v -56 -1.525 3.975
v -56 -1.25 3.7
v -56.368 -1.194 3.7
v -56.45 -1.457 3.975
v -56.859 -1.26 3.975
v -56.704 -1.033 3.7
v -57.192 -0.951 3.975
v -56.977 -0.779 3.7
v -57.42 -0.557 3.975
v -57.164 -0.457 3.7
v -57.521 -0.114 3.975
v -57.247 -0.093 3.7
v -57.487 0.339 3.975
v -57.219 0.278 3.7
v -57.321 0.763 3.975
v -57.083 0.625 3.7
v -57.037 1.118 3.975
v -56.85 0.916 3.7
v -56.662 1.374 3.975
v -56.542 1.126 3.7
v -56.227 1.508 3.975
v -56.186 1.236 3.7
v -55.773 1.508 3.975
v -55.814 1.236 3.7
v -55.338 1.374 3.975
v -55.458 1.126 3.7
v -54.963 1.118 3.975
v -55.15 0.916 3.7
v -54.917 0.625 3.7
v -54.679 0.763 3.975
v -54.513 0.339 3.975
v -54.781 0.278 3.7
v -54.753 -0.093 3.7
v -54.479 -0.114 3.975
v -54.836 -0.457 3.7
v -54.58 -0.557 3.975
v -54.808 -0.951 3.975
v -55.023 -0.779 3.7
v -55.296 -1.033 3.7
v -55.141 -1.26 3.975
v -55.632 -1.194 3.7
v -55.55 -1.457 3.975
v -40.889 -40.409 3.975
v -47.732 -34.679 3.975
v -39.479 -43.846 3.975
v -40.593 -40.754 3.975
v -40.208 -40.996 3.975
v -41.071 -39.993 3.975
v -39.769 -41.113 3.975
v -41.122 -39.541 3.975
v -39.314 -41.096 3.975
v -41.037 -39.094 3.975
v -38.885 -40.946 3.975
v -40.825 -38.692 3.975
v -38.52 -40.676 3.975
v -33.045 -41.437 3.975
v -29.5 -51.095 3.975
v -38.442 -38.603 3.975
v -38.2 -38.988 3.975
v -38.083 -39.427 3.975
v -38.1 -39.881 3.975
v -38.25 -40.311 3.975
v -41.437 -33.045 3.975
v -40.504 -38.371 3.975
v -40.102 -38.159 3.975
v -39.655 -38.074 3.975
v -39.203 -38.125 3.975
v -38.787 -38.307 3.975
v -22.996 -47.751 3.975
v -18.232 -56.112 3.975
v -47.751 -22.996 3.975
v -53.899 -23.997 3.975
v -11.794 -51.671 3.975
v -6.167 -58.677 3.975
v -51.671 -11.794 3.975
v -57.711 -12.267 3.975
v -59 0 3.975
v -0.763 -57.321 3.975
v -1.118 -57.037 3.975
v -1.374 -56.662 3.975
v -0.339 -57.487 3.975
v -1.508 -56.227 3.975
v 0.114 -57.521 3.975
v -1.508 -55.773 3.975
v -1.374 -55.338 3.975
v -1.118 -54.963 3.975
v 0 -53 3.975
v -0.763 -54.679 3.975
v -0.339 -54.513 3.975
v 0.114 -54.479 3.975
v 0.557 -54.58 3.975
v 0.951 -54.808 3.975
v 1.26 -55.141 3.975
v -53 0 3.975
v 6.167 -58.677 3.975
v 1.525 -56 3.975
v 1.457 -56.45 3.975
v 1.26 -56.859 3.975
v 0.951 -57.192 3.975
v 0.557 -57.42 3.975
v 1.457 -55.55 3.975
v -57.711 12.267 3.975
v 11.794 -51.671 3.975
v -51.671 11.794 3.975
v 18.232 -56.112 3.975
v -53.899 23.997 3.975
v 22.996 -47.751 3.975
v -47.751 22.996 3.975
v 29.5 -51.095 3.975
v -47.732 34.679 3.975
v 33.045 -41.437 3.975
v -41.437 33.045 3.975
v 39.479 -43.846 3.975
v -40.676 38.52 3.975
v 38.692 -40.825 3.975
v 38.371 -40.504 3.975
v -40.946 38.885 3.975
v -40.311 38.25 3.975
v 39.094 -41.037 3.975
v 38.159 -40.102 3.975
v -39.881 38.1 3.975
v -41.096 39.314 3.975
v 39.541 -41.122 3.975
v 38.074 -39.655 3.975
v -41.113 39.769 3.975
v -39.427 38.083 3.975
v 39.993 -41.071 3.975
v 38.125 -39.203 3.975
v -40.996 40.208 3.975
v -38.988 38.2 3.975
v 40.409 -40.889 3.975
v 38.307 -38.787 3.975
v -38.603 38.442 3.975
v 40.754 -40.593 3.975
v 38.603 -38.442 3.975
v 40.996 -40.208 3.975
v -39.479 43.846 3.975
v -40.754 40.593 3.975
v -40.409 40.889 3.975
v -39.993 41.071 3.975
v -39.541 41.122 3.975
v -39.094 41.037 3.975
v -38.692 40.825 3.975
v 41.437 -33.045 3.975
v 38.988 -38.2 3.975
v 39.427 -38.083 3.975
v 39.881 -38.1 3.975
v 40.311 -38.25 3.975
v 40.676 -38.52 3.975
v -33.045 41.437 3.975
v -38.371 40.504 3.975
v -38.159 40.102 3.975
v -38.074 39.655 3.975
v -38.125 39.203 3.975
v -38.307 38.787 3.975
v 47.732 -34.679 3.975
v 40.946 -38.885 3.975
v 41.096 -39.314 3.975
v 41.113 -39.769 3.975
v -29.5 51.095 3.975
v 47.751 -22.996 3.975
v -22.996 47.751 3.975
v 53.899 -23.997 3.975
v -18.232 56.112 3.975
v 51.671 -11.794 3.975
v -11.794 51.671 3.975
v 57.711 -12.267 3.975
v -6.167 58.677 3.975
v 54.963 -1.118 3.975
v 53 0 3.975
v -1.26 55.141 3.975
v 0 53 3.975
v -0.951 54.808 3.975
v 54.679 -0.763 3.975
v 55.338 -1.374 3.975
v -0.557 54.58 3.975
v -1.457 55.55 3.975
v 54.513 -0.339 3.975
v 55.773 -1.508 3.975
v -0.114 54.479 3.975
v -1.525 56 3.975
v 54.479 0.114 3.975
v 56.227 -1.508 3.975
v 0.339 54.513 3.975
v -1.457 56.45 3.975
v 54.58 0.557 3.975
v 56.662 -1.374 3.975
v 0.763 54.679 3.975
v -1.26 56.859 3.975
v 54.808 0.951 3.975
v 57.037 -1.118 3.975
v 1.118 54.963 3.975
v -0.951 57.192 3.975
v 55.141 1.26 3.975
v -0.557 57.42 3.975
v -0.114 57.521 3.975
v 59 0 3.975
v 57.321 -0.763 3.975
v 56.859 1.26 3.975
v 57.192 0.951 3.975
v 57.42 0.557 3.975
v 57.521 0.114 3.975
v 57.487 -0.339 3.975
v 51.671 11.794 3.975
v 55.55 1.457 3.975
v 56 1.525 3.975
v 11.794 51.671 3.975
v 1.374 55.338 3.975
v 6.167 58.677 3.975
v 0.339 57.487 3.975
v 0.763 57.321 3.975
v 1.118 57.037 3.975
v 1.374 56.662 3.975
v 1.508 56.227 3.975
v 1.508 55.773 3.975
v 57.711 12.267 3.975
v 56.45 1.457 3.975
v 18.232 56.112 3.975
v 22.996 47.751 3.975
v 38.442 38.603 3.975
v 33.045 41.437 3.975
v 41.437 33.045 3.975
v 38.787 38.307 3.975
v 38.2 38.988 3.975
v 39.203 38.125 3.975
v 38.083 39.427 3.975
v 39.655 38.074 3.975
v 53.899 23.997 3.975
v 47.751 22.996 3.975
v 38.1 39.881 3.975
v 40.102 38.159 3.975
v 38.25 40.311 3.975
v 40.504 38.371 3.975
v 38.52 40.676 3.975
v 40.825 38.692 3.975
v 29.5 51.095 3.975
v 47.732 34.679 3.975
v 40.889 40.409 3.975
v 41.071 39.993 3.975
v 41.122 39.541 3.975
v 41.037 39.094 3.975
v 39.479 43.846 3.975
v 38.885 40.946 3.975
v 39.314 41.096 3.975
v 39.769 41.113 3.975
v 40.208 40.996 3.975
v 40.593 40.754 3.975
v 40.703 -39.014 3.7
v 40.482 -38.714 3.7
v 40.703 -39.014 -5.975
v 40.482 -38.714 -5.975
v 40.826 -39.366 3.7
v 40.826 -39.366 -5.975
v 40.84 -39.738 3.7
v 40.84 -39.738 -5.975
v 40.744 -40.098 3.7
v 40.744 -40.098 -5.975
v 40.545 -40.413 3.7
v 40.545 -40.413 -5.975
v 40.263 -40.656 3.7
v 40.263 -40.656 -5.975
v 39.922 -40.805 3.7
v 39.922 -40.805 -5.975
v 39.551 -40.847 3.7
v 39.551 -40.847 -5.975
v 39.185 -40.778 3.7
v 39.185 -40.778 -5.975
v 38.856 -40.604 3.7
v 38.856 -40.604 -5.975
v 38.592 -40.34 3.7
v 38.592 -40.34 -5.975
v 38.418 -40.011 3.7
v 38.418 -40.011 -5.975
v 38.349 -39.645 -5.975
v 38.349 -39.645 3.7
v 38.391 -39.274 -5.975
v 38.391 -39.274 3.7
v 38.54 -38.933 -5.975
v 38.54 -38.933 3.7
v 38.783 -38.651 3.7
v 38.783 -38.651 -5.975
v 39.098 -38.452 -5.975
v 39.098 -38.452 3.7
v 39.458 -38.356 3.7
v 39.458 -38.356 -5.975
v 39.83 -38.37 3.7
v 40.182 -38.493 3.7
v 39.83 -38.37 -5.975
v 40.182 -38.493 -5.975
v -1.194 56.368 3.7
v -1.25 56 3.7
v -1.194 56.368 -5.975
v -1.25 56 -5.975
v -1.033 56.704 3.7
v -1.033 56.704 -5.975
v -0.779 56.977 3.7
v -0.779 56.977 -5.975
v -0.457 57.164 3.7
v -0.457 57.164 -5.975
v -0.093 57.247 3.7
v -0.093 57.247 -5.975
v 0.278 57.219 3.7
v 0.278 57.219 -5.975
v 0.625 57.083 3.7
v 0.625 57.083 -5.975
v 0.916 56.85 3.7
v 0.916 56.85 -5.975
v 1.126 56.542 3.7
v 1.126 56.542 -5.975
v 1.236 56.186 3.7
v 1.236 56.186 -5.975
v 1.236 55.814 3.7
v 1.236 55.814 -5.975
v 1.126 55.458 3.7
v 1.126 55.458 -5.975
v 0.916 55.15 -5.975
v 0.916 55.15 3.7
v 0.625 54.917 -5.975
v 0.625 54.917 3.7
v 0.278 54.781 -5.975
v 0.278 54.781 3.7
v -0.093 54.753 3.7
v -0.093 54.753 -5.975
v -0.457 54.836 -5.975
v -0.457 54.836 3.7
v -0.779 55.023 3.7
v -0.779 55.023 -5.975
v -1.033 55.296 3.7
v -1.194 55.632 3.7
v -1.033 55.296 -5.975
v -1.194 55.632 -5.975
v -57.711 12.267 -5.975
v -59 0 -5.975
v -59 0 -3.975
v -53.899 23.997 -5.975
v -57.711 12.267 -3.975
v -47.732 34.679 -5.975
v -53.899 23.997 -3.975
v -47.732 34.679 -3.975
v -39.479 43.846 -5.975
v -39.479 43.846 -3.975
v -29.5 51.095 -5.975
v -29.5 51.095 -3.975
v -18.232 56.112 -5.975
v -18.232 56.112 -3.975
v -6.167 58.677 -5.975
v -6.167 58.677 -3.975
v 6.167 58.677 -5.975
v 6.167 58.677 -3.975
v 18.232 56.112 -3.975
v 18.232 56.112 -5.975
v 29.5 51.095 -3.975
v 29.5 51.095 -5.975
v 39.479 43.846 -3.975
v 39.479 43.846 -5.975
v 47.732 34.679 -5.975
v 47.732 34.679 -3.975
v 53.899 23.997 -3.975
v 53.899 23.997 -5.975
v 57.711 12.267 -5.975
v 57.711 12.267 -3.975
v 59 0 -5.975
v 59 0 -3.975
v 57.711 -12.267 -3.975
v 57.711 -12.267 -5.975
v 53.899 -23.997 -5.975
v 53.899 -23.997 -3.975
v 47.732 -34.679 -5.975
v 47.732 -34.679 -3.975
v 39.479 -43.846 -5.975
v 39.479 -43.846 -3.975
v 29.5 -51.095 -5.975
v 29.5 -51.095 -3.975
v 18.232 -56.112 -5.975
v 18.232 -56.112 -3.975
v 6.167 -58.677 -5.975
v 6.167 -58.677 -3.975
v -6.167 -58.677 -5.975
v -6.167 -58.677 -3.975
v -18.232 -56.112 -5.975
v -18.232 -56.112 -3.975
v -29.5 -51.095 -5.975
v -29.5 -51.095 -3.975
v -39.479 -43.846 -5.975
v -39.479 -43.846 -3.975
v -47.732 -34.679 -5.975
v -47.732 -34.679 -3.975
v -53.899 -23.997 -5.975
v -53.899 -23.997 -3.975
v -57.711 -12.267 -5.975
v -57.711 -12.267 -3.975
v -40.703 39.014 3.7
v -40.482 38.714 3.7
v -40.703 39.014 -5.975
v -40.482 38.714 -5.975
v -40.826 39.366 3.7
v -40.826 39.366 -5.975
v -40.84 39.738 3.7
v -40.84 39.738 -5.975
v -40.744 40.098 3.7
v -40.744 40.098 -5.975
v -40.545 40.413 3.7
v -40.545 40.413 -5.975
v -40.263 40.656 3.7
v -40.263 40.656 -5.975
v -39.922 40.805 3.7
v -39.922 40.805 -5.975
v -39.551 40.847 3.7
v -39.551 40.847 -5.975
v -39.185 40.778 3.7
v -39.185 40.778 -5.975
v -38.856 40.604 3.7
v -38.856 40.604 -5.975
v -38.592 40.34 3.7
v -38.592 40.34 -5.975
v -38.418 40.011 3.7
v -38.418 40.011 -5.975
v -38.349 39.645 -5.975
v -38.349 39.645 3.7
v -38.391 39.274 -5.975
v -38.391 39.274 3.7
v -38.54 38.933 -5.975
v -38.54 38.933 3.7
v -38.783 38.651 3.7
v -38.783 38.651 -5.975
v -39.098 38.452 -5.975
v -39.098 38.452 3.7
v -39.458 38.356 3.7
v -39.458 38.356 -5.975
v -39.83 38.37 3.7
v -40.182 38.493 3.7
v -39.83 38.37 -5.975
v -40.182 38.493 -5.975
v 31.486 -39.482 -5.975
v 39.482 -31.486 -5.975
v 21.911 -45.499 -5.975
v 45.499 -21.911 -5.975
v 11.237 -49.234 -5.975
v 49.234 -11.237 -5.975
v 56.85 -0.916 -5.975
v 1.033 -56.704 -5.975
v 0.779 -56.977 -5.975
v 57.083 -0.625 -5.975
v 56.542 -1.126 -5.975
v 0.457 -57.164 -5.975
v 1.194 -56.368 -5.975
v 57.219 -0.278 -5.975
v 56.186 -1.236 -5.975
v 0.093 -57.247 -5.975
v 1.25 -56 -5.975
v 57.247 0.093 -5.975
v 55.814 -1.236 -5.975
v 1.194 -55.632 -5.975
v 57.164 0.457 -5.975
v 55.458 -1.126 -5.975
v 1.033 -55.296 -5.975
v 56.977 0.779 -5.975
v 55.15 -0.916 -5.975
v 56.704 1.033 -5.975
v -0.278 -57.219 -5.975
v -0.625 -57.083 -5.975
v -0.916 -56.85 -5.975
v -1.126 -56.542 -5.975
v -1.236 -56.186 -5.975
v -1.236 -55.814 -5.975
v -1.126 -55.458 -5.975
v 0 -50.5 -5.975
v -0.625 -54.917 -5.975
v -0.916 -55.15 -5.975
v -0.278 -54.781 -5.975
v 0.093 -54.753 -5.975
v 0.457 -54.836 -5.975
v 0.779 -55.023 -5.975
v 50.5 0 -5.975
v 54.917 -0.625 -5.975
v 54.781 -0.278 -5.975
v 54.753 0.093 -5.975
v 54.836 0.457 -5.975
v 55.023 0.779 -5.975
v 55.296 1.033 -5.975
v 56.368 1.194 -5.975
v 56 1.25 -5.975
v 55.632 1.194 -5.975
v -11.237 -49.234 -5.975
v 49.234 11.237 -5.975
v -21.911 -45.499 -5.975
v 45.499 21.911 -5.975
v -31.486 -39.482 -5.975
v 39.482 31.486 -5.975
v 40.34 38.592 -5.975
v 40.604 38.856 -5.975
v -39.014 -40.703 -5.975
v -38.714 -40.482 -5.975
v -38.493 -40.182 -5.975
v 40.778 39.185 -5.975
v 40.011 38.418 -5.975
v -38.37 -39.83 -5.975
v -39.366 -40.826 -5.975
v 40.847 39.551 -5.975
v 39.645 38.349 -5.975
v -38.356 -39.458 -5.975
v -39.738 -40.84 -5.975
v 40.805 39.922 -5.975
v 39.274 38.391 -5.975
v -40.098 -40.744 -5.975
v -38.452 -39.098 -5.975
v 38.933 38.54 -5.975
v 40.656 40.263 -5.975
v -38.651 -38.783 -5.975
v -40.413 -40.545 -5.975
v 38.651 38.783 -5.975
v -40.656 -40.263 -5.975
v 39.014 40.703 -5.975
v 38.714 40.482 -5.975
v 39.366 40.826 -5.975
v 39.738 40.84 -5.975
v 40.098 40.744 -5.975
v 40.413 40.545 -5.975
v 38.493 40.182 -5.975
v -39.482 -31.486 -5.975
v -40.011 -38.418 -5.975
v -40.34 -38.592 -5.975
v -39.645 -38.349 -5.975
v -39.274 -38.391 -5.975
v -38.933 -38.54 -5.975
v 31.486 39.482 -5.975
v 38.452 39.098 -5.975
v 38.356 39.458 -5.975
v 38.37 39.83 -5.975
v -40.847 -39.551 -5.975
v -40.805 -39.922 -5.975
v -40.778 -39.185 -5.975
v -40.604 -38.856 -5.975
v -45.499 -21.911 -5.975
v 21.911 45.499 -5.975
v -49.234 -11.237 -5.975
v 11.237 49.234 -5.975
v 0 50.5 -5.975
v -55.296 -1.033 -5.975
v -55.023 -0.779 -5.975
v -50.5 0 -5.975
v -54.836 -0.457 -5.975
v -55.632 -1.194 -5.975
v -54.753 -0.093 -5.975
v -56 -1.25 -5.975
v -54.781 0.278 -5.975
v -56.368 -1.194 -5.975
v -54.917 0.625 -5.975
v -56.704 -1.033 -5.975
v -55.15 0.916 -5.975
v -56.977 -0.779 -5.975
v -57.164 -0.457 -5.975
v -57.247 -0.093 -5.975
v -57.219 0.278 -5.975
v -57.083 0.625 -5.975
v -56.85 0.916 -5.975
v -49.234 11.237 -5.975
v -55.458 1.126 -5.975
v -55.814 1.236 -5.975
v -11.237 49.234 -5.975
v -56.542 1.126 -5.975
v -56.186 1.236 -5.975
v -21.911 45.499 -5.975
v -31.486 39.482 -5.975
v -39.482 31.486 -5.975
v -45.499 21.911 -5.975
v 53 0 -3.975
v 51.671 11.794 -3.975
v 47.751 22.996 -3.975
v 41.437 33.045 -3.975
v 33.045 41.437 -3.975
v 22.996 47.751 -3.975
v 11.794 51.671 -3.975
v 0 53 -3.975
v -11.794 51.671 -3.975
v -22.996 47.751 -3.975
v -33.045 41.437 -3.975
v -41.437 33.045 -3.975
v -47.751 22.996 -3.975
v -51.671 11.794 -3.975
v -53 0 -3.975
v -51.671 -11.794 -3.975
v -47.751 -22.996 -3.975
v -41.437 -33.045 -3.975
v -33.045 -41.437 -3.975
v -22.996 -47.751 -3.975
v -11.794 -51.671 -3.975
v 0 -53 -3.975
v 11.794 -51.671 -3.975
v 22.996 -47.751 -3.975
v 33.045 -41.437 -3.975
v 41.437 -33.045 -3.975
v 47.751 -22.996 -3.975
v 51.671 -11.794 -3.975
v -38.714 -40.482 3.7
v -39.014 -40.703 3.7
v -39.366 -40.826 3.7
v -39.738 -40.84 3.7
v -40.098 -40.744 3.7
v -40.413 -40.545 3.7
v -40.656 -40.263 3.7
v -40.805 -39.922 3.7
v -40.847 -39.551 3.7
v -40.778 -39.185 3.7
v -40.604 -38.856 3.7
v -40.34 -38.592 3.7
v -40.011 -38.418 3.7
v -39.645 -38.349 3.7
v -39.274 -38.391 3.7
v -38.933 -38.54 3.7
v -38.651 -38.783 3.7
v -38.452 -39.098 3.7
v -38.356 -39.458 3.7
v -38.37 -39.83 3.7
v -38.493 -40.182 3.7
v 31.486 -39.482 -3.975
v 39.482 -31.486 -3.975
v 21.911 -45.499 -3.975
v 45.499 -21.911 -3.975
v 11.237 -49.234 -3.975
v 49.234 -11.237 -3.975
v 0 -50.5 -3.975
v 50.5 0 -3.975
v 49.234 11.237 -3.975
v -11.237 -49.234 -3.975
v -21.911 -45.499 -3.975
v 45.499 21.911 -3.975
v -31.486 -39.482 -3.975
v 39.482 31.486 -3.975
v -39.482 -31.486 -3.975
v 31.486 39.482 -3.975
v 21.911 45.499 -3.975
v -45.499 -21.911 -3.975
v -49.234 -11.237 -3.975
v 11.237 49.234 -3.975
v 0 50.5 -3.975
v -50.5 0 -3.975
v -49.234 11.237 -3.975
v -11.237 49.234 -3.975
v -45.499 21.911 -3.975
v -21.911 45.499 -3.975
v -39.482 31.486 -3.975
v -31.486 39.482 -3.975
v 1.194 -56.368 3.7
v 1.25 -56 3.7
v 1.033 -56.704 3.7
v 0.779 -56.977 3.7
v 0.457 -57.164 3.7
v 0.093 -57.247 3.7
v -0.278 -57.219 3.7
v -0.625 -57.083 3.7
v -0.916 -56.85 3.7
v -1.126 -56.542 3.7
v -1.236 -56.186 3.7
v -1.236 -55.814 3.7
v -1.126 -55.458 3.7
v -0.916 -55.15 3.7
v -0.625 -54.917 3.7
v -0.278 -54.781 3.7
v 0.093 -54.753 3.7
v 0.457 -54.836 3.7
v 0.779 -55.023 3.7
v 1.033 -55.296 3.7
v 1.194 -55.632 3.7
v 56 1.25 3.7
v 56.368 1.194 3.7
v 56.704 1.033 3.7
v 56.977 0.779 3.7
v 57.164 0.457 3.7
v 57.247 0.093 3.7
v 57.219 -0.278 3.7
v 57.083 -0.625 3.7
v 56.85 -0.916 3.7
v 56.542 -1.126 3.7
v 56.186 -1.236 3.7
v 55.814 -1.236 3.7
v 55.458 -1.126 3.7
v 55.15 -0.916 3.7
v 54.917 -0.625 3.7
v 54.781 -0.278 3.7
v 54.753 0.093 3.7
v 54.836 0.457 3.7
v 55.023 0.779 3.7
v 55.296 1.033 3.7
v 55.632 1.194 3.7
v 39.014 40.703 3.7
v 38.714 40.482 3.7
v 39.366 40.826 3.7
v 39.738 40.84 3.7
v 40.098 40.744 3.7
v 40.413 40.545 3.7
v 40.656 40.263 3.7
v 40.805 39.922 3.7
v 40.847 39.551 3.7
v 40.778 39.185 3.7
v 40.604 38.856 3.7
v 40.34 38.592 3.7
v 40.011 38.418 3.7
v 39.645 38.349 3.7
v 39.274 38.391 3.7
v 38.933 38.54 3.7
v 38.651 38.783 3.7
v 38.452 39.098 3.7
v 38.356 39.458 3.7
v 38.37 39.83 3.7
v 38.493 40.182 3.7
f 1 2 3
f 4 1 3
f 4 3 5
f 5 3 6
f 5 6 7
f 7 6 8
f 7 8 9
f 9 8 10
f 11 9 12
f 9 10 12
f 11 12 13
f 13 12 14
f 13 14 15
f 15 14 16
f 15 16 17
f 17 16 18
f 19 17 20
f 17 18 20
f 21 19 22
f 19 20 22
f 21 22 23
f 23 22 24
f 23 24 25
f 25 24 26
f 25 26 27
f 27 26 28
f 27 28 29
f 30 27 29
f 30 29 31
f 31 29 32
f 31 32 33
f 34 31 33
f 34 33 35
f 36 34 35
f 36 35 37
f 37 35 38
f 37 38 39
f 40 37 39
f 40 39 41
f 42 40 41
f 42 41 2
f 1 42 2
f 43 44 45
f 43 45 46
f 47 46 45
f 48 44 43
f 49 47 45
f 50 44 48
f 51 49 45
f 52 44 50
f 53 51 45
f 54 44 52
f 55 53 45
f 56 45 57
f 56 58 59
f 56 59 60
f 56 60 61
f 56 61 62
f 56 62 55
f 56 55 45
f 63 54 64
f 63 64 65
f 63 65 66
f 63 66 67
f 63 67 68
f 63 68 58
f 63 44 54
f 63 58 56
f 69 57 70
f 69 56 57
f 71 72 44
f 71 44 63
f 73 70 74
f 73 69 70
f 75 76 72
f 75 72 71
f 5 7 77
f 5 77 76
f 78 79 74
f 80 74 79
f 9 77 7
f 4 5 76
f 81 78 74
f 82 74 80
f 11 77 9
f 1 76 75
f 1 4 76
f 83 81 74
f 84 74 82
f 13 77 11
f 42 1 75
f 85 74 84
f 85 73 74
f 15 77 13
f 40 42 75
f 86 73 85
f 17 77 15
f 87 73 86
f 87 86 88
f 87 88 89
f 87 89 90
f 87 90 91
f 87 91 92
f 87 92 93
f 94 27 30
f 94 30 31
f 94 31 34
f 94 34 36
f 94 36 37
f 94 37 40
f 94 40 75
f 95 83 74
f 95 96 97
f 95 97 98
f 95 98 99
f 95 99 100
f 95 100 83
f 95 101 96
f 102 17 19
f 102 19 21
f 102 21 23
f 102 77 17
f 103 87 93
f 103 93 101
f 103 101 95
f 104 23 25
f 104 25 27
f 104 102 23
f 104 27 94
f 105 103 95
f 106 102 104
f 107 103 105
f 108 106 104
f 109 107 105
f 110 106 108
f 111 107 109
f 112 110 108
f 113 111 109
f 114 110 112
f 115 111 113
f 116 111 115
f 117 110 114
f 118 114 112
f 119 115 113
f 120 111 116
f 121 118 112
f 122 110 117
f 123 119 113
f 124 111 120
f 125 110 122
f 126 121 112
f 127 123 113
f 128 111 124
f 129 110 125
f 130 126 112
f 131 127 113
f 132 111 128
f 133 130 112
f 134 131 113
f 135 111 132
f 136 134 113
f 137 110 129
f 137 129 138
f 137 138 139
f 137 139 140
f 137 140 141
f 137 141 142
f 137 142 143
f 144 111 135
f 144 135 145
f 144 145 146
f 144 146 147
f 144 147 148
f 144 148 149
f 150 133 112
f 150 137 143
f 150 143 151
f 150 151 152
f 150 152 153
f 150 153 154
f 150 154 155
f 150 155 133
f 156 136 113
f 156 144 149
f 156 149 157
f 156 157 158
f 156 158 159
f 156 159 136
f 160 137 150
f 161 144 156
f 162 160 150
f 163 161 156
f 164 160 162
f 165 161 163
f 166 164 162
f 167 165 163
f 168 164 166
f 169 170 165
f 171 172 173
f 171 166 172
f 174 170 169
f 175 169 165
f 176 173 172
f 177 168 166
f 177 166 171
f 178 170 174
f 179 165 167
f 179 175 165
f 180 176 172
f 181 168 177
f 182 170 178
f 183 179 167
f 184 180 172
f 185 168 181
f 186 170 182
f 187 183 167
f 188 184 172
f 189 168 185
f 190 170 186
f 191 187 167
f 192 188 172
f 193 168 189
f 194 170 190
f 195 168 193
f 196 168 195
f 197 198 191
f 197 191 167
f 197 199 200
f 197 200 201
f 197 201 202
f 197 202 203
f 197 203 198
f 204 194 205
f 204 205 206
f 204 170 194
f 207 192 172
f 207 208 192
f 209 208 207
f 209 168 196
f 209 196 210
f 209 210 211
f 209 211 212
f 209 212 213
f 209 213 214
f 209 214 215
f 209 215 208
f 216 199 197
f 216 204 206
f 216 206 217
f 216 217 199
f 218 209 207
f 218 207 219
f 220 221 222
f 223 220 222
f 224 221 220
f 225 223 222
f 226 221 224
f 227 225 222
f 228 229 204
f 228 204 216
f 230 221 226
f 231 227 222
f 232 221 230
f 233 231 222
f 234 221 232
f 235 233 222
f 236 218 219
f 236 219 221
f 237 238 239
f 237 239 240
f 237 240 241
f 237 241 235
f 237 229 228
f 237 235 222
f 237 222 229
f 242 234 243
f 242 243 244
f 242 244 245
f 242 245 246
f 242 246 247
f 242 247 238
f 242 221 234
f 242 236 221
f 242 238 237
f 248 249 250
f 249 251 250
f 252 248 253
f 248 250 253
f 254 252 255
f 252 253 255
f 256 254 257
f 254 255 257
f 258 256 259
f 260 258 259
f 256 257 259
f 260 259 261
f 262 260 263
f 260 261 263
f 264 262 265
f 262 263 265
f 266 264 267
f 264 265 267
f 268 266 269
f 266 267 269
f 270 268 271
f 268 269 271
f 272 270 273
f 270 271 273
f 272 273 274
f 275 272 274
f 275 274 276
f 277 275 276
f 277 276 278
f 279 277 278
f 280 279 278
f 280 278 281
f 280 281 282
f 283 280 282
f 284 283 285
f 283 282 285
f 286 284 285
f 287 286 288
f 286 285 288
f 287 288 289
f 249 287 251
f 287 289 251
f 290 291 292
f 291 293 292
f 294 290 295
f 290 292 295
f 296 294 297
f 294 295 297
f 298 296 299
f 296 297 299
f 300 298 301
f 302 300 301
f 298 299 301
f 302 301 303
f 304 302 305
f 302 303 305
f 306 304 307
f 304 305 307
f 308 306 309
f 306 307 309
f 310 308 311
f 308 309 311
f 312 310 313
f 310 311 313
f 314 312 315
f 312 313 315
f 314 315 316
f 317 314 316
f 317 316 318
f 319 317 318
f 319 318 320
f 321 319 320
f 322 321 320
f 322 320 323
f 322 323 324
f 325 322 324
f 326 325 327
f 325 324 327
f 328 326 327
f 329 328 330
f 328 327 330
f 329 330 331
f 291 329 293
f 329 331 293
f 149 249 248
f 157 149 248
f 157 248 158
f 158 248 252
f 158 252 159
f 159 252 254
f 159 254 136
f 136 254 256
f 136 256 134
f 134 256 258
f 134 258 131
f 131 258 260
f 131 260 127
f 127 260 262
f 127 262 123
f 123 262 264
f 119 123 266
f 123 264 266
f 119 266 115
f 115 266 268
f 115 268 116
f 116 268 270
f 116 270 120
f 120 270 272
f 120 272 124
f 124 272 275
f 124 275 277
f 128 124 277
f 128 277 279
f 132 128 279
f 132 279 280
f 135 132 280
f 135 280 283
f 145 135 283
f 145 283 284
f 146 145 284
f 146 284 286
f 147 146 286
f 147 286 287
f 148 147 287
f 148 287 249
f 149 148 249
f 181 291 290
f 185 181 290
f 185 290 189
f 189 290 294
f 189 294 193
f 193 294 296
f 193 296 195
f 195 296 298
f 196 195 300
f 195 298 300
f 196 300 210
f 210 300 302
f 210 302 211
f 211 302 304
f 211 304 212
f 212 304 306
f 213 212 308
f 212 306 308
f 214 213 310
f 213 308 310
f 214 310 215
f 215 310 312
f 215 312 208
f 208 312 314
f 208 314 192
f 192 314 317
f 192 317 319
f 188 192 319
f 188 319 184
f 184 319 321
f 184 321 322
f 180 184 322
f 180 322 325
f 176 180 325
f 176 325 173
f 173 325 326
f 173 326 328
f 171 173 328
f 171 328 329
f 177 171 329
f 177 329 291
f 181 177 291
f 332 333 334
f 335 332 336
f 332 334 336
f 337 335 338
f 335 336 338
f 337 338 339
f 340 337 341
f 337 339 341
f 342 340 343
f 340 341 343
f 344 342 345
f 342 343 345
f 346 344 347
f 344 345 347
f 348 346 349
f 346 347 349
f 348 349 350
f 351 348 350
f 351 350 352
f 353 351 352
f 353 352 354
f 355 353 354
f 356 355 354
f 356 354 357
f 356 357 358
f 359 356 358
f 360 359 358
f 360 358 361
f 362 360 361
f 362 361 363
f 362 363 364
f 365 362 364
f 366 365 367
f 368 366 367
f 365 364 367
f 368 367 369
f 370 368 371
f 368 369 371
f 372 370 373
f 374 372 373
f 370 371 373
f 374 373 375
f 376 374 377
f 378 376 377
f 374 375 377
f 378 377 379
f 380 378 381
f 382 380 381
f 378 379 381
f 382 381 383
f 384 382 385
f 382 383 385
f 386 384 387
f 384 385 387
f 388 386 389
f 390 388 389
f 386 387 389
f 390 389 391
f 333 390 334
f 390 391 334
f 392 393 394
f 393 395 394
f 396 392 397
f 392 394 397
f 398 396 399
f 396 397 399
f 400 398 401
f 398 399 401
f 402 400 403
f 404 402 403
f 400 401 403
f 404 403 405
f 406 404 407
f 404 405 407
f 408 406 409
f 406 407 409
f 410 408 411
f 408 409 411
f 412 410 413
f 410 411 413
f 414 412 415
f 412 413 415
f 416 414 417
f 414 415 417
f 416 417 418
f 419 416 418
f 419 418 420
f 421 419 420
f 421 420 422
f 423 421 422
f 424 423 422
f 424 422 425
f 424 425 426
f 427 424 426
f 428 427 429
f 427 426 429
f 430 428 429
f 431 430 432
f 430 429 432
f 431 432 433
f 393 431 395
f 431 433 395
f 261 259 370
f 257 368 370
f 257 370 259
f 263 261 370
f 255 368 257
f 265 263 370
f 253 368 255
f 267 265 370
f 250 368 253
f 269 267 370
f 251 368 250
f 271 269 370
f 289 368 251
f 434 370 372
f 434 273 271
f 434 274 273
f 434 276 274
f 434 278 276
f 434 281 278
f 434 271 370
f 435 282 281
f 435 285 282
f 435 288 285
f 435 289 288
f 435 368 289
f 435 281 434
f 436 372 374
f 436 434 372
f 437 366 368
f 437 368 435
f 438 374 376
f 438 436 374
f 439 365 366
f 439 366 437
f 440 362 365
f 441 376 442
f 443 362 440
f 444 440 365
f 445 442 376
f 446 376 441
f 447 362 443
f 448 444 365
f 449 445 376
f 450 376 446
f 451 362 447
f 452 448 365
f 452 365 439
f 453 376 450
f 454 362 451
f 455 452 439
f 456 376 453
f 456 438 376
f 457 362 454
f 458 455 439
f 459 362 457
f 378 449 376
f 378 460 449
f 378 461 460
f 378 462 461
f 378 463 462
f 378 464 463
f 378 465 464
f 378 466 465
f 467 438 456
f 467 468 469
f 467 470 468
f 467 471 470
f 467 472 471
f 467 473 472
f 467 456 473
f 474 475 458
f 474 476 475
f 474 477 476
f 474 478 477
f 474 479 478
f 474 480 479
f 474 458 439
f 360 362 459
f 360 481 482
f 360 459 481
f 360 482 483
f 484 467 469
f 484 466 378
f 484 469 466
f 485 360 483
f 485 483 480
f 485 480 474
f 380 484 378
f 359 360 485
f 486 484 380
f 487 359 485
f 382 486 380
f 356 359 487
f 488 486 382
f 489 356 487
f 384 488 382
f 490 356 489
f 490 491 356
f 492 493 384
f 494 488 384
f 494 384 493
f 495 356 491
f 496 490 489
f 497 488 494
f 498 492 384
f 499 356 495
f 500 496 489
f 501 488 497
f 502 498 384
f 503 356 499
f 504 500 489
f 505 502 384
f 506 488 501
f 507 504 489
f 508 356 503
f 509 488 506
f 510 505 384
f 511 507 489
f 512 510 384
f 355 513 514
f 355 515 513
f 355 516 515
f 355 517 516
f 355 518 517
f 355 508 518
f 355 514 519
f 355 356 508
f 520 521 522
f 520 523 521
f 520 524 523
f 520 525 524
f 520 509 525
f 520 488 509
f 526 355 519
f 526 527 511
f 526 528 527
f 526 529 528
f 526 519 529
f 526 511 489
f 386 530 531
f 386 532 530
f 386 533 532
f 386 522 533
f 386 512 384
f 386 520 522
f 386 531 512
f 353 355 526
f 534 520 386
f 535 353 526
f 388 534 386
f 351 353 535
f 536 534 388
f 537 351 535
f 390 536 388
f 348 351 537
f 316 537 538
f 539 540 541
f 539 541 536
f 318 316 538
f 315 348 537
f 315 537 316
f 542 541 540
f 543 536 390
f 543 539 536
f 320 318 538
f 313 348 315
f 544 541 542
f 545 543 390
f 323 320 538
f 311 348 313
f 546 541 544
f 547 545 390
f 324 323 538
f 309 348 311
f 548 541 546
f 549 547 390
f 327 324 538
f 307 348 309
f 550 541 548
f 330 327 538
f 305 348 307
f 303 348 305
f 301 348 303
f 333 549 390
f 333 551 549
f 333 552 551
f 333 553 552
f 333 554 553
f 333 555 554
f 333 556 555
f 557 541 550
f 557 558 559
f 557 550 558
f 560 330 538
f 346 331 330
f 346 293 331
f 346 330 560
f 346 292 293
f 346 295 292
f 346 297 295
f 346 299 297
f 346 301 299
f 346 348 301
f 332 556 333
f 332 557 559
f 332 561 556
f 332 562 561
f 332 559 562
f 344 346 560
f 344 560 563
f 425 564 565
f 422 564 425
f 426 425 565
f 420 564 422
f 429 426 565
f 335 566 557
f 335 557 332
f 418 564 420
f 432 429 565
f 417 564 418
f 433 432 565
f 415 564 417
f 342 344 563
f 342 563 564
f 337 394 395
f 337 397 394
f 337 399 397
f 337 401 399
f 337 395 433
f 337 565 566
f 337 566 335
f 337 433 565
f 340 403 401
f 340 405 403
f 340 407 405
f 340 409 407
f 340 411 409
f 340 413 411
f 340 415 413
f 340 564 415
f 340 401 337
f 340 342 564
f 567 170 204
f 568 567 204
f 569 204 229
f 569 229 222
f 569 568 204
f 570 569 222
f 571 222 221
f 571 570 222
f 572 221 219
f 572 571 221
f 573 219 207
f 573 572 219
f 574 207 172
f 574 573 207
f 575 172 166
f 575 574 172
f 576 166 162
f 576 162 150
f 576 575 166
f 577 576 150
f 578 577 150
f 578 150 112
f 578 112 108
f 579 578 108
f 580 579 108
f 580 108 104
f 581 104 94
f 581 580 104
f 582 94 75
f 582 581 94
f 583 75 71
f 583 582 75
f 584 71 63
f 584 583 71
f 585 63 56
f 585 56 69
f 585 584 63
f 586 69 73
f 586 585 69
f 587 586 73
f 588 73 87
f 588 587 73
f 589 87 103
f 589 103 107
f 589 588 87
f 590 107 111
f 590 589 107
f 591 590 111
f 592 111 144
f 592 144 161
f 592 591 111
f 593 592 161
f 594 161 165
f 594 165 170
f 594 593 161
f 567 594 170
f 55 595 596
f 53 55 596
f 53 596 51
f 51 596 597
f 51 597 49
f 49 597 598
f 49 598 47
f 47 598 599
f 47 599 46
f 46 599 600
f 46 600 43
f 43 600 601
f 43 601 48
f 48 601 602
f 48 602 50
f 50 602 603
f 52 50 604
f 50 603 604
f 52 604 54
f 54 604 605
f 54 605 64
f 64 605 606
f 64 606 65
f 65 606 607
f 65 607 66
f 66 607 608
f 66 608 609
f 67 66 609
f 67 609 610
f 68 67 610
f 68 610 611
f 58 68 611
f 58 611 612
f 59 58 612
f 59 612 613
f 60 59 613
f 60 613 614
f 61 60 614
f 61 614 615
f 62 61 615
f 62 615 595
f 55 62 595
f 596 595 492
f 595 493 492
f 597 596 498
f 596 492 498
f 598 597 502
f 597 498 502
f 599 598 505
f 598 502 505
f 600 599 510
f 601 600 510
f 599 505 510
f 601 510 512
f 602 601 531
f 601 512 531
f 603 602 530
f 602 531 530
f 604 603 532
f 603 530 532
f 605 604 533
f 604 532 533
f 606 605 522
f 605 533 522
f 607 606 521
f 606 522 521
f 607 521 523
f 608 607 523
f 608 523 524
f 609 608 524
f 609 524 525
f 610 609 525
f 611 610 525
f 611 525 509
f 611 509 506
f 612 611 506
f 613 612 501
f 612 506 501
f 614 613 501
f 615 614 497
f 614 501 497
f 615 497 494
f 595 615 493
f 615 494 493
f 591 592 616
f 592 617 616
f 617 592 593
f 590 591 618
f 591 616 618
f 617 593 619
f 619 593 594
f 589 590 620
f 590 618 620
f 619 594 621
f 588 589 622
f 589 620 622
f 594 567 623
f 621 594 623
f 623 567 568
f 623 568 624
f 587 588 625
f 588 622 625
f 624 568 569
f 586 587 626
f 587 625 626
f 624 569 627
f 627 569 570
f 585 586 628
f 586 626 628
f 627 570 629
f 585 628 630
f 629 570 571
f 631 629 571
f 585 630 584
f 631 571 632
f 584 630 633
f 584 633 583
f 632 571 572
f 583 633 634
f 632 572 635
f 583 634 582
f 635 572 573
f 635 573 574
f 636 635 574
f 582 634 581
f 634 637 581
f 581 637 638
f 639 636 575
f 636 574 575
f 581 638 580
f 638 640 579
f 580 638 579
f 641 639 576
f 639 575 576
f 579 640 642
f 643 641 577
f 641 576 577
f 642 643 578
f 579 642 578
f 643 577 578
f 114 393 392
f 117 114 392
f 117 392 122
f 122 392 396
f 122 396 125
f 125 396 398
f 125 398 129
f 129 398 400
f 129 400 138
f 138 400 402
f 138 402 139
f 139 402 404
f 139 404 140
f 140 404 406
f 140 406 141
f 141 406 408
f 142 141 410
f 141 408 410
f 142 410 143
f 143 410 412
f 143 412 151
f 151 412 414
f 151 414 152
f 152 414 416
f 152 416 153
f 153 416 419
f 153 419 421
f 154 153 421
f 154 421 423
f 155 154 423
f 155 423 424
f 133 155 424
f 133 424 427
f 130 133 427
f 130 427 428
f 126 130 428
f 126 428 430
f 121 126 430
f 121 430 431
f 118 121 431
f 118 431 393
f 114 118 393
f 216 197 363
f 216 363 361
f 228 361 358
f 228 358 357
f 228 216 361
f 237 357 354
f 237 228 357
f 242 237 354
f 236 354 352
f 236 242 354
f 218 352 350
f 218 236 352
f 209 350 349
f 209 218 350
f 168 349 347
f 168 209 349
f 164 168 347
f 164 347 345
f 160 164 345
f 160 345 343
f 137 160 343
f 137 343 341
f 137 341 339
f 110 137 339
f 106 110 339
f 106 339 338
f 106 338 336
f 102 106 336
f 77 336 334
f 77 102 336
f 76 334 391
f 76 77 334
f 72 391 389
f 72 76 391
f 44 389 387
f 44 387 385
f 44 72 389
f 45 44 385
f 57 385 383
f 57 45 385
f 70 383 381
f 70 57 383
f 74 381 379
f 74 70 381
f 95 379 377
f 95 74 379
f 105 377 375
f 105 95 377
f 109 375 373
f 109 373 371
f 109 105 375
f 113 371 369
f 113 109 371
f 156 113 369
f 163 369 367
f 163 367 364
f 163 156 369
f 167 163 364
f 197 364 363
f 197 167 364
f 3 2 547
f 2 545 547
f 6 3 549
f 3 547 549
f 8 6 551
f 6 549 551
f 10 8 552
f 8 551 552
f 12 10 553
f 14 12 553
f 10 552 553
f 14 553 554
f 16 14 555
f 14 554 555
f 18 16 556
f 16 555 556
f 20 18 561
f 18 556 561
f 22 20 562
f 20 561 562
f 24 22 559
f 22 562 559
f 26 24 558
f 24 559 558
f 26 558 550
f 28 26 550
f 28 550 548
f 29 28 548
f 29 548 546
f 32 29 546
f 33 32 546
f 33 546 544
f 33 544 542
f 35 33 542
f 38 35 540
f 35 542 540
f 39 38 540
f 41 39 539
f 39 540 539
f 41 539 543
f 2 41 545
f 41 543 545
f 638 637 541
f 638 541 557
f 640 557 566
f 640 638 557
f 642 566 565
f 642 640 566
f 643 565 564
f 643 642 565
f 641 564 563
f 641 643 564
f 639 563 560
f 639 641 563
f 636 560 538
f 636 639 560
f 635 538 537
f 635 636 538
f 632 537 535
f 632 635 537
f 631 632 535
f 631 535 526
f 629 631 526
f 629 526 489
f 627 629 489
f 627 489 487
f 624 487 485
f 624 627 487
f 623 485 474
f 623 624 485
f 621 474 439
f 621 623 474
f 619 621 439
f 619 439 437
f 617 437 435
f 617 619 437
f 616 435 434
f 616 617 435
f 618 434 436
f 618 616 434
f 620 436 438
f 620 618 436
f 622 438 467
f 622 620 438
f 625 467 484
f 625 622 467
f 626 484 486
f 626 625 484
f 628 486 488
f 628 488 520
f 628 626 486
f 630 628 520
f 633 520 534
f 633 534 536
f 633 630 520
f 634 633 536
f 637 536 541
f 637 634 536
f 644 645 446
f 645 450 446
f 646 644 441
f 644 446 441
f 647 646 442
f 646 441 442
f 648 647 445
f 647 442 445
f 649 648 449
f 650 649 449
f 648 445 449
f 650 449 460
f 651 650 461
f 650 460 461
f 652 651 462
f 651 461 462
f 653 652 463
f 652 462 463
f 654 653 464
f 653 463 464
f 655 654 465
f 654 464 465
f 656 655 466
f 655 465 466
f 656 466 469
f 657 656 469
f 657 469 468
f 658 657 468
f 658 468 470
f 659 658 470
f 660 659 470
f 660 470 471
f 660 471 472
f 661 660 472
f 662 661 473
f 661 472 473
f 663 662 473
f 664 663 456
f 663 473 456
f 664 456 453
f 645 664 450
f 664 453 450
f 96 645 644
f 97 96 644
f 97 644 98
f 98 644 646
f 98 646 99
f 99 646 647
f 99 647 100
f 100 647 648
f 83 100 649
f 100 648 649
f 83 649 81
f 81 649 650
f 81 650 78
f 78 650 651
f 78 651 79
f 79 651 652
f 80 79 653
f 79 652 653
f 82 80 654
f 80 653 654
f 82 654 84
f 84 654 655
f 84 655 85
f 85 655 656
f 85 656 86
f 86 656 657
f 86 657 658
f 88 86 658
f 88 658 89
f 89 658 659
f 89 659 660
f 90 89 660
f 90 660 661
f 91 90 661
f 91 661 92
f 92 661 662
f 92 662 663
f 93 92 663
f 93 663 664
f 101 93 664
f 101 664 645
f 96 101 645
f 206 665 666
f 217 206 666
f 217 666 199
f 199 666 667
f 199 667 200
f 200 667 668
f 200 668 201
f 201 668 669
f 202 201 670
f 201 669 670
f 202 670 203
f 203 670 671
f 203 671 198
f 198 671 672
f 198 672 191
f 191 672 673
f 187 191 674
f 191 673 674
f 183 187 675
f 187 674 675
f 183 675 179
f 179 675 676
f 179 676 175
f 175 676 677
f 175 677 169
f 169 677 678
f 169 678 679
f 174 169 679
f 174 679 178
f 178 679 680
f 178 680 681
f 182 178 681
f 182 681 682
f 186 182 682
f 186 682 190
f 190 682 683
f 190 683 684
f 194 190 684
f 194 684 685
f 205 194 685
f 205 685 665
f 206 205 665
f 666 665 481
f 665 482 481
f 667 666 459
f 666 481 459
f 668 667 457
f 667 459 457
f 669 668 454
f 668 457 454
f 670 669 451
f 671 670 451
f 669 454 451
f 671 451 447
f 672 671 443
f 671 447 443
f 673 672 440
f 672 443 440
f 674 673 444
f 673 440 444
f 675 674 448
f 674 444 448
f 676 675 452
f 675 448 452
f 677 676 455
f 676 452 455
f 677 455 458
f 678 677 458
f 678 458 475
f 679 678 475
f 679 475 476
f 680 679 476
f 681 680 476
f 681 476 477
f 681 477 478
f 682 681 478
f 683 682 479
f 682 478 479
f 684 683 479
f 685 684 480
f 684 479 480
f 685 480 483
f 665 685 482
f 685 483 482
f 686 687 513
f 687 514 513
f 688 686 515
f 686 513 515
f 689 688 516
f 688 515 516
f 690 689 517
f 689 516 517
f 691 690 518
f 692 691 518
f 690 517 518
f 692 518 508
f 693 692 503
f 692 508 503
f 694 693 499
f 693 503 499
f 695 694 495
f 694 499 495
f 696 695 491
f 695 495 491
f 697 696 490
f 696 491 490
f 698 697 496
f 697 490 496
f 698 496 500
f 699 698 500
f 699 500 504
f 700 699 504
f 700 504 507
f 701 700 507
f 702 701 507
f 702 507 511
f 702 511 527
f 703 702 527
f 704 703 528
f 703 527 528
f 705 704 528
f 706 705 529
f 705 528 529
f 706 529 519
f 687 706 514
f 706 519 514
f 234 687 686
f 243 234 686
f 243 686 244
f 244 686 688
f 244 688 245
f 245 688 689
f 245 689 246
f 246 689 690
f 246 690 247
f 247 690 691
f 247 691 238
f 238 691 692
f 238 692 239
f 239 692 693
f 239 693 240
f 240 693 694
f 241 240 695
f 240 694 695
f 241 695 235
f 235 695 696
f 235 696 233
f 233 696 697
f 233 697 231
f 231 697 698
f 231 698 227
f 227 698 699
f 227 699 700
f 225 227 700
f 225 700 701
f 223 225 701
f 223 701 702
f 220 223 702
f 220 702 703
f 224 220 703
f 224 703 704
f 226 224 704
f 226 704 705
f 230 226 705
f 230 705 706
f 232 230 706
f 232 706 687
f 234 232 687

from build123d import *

# Parameters (mm, degrees)
SKETCH_1_R                   = 59
SKETCH_1_R_2                 = 53
EXTRUDE_1_DEPTH              = 3.975
SKETCH_2_R                   = 59
SKETCH_2_R_2                 = 50.5
EXTRUDE_2_DEPTH              = 2
HOLE_WIZARD_M3_1_D           = 2.5
HOLE_WIZARD_M3_1_CSINK_D     = 3.05
HOLE_WIZARD_M3_1_CSINK_ANGLE = 90
PATTERN_CIRCULAR_1_COUNT     = 8


with BuildPart() as part:
    # 草图1 → 凸台-拉伸1 (new, symmetric)
    with BuildSketch(Plane.XY):
        Circle(SKETCH_1_R)
        Circle(SKETCH_1_R_2, mode=Mode.SUBTRACT)
    extrude(amount=EXTRUDE_1_DEPTH, both=True)

    # 草图2 → 凸台-拉伸2 (add)
    with BuildSketch(Plane(origin=(0, 0, -3.975), x_dir=(-1, 0, 0), z_dir=(0, 0, -1))):
        Circle(SKETCH_2_R)
        Circle(SKETCH_2_R_2, mode=Mode.SUBTRACT)
    extrude(amount=EXTRUDE_2_DEPTH)

    # M3 螺纹孔1 (through all)
    with Locations(Plane.XY.offset(3.975)):
        with Locations((0, 56)):
            hole_wizard_m3_1 = CounterSinkHole(HOLE_WIZARD_M3_1_D / 2, HOLE_WIZARD_M3_1_CSINK_D / 2, counter_sink_angle=HOLE_WIZARD_M3_1_CSINK_ANGLE)

    # 阵列(圆周)1: M3 螺纹孔1 ×8 about axis
    pattern_circular_1_axis = Axis((0, 0, 0), (0, 0, 1))
    for i in range(1, PATTERN_CIRCULAR_1_COUNT):
        add(hole_wizard_m3_1.rotate(pattern_circular_1_axis, i * 360 / PATTERN_CIRCULAR_1_COUNT), mode=Mode.SUBTRACT)


solid = part.part
